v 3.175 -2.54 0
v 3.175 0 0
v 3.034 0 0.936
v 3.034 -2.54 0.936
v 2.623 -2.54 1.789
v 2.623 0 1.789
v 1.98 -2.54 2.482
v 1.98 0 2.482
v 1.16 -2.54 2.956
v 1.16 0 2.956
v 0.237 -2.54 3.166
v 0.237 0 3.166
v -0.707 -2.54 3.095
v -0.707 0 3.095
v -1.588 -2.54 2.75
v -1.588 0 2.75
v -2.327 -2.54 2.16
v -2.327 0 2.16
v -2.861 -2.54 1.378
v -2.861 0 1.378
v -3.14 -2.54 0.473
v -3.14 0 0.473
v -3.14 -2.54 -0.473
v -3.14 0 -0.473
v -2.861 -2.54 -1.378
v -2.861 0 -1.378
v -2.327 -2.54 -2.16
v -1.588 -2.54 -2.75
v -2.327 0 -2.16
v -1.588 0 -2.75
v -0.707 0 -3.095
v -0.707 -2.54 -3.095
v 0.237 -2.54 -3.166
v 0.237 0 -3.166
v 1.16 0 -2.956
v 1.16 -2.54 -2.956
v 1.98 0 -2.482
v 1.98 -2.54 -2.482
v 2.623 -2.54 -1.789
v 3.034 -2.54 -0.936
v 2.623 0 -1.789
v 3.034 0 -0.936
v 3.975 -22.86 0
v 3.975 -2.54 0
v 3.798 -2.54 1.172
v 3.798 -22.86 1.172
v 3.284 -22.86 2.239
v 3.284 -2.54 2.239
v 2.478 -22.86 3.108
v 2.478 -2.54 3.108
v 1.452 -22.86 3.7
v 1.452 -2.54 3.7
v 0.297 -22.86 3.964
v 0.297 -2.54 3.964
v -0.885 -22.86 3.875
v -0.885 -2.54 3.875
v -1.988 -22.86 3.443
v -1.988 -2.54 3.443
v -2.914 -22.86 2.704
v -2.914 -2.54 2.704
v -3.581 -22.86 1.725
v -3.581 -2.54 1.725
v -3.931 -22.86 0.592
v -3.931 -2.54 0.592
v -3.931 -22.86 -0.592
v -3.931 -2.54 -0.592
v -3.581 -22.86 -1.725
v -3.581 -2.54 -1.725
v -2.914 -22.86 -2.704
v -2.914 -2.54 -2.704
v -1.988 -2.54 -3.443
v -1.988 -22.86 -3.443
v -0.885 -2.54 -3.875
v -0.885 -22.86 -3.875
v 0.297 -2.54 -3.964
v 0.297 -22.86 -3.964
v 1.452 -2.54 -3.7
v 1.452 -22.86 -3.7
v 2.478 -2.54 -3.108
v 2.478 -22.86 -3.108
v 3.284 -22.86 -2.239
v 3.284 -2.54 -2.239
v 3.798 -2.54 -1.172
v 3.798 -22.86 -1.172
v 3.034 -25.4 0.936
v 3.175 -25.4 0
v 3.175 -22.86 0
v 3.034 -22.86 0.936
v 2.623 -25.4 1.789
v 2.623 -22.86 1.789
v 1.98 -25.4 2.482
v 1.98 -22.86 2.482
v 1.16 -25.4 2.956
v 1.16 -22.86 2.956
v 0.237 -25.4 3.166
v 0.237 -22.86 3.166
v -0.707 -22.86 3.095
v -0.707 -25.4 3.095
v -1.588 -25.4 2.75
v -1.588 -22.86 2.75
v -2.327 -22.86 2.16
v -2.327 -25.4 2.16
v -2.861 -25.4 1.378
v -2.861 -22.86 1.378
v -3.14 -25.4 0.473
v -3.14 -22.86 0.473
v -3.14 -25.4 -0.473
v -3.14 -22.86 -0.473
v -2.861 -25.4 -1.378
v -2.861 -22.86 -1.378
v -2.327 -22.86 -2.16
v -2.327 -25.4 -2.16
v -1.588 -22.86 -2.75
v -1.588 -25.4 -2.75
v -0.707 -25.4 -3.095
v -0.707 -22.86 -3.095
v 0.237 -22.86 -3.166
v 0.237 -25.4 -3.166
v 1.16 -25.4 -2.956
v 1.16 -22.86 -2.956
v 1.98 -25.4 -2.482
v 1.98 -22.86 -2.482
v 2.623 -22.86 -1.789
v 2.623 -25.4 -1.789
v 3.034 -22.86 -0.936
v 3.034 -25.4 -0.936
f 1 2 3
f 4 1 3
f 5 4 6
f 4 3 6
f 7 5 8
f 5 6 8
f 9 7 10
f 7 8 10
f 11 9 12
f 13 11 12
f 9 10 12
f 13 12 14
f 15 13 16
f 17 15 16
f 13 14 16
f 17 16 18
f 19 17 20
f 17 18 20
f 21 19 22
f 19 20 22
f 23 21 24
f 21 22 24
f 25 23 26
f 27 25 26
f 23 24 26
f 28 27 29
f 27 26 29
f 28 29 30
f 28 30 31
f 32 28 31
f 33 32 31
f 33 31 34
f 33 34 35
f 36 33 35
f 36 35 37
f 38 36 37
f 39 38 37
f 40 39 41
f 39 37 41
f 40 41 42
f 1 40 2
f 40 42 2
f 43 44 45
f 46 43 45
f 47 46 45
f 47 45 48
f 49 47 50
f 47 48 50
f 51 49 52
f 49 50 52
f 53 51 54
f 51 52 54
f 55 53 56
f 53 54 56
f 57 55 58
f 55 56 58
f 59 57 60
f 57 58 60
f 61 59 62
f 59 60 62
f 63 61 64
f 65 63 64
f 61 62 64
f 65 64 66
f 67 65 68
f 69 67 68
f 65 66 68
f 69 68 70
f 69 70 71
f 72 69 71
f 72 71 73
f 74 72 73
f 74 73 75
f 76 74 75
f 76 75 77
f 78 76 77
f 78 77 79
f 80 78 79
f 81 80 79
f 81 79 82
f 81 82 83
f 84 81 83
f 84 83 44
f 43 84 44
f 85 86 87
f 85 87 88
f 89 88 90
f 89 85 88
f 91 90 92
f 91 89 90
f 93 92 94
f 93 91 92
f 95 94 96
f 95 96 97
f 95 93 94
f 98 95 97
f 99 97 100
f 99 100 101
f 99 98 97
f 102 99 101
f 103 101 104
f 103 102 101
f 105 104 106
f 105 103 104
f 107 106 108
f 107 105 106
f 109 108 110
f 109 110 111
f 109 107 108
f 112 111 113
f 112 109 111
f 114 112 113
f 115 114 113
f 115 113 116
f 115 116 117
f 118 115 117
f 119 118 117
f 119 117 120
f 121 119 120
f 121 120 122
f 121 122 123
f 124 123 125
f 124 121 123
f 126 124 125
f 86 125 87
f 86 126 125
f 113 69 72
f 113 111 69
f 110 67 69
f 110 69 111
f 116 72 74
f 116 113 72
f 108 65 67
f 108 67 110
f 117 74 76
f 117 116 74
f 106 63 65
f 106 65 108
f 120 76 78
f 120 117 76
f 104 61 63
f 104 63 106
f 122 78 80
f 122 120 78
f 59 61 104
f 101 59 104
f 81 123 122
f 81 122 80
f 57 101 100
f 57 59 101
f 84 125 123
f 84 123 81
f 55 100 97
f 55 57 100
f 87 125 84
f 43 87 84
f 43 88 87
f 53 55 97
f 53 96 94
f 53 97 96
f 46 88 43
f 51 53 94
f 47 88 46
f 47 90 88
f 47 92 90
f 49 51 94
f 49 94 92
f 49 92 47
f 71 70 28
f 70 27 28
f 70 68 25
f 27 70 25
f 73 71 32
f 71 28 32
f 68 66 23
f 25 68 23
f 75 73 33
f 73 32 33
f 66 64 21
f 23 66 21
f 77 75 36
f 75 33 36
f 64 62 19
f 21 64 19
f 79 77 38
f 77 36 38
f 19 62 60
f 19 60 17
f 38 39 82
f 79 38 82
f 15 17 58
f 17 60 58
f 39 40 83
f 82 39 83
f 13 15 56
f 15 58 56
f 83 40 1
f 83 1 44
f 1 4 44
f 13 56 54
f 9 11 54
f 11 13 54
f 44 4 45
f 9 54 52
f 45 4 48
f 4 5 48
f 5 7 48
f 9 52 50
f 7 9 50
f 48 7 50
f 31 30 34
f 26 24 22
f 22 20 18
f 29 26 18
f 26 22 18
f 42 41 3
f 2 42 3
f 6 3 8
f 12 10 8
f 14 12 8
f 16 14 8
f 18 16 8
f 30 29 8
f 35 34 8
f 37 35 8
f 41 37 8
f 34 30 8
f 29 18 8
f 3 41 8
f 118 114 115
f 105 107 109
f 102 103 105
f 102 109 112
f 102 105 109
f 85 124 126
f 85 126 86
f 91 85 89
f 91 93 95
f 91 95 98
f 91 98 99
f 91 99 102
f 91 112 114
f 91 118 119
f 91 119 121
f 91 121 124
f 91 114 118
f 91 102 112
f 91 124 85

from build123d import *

# Parameters (mm, degrees)
F0_R     = 3.9751
F1_DEPTH = 25.4
F2_R     = 3.9751
F2_R_2   = 3.175
F3_DEPTH = 2.54
F4_R     = 3.9751
F4_R_2   = 3.175
F5_DEPTH = 2.54


with BuildPart() as f1:
    # F0 (on Front) → F1 (new body)
    with BuildSketch(Plane.XZ):
        Circle(F0_R)
    extrude(amount=F1_DEPTH)

    # F2 (on face) → F3 (cut)
    with BuildSketch(Plane.XZ.offset(25.4)):
        Circle(F2_R)
        Circle(F2_R_2, mode=Mode.SUBTRACT)
    extrude(amount=-F3_DEPTH, mode=Mode.SUBTRACT)

    # F4 (on Front) → F5 (cut)
    with BuildSketch(Plane.XZ):
        Circle(F4_R)
        Circle(F4_R_2, mode=Mode.SUBTRACT)
    extrude(amount=F5_DEPTH, mode=Mode.SUBTRACT)


solid = f1.part
